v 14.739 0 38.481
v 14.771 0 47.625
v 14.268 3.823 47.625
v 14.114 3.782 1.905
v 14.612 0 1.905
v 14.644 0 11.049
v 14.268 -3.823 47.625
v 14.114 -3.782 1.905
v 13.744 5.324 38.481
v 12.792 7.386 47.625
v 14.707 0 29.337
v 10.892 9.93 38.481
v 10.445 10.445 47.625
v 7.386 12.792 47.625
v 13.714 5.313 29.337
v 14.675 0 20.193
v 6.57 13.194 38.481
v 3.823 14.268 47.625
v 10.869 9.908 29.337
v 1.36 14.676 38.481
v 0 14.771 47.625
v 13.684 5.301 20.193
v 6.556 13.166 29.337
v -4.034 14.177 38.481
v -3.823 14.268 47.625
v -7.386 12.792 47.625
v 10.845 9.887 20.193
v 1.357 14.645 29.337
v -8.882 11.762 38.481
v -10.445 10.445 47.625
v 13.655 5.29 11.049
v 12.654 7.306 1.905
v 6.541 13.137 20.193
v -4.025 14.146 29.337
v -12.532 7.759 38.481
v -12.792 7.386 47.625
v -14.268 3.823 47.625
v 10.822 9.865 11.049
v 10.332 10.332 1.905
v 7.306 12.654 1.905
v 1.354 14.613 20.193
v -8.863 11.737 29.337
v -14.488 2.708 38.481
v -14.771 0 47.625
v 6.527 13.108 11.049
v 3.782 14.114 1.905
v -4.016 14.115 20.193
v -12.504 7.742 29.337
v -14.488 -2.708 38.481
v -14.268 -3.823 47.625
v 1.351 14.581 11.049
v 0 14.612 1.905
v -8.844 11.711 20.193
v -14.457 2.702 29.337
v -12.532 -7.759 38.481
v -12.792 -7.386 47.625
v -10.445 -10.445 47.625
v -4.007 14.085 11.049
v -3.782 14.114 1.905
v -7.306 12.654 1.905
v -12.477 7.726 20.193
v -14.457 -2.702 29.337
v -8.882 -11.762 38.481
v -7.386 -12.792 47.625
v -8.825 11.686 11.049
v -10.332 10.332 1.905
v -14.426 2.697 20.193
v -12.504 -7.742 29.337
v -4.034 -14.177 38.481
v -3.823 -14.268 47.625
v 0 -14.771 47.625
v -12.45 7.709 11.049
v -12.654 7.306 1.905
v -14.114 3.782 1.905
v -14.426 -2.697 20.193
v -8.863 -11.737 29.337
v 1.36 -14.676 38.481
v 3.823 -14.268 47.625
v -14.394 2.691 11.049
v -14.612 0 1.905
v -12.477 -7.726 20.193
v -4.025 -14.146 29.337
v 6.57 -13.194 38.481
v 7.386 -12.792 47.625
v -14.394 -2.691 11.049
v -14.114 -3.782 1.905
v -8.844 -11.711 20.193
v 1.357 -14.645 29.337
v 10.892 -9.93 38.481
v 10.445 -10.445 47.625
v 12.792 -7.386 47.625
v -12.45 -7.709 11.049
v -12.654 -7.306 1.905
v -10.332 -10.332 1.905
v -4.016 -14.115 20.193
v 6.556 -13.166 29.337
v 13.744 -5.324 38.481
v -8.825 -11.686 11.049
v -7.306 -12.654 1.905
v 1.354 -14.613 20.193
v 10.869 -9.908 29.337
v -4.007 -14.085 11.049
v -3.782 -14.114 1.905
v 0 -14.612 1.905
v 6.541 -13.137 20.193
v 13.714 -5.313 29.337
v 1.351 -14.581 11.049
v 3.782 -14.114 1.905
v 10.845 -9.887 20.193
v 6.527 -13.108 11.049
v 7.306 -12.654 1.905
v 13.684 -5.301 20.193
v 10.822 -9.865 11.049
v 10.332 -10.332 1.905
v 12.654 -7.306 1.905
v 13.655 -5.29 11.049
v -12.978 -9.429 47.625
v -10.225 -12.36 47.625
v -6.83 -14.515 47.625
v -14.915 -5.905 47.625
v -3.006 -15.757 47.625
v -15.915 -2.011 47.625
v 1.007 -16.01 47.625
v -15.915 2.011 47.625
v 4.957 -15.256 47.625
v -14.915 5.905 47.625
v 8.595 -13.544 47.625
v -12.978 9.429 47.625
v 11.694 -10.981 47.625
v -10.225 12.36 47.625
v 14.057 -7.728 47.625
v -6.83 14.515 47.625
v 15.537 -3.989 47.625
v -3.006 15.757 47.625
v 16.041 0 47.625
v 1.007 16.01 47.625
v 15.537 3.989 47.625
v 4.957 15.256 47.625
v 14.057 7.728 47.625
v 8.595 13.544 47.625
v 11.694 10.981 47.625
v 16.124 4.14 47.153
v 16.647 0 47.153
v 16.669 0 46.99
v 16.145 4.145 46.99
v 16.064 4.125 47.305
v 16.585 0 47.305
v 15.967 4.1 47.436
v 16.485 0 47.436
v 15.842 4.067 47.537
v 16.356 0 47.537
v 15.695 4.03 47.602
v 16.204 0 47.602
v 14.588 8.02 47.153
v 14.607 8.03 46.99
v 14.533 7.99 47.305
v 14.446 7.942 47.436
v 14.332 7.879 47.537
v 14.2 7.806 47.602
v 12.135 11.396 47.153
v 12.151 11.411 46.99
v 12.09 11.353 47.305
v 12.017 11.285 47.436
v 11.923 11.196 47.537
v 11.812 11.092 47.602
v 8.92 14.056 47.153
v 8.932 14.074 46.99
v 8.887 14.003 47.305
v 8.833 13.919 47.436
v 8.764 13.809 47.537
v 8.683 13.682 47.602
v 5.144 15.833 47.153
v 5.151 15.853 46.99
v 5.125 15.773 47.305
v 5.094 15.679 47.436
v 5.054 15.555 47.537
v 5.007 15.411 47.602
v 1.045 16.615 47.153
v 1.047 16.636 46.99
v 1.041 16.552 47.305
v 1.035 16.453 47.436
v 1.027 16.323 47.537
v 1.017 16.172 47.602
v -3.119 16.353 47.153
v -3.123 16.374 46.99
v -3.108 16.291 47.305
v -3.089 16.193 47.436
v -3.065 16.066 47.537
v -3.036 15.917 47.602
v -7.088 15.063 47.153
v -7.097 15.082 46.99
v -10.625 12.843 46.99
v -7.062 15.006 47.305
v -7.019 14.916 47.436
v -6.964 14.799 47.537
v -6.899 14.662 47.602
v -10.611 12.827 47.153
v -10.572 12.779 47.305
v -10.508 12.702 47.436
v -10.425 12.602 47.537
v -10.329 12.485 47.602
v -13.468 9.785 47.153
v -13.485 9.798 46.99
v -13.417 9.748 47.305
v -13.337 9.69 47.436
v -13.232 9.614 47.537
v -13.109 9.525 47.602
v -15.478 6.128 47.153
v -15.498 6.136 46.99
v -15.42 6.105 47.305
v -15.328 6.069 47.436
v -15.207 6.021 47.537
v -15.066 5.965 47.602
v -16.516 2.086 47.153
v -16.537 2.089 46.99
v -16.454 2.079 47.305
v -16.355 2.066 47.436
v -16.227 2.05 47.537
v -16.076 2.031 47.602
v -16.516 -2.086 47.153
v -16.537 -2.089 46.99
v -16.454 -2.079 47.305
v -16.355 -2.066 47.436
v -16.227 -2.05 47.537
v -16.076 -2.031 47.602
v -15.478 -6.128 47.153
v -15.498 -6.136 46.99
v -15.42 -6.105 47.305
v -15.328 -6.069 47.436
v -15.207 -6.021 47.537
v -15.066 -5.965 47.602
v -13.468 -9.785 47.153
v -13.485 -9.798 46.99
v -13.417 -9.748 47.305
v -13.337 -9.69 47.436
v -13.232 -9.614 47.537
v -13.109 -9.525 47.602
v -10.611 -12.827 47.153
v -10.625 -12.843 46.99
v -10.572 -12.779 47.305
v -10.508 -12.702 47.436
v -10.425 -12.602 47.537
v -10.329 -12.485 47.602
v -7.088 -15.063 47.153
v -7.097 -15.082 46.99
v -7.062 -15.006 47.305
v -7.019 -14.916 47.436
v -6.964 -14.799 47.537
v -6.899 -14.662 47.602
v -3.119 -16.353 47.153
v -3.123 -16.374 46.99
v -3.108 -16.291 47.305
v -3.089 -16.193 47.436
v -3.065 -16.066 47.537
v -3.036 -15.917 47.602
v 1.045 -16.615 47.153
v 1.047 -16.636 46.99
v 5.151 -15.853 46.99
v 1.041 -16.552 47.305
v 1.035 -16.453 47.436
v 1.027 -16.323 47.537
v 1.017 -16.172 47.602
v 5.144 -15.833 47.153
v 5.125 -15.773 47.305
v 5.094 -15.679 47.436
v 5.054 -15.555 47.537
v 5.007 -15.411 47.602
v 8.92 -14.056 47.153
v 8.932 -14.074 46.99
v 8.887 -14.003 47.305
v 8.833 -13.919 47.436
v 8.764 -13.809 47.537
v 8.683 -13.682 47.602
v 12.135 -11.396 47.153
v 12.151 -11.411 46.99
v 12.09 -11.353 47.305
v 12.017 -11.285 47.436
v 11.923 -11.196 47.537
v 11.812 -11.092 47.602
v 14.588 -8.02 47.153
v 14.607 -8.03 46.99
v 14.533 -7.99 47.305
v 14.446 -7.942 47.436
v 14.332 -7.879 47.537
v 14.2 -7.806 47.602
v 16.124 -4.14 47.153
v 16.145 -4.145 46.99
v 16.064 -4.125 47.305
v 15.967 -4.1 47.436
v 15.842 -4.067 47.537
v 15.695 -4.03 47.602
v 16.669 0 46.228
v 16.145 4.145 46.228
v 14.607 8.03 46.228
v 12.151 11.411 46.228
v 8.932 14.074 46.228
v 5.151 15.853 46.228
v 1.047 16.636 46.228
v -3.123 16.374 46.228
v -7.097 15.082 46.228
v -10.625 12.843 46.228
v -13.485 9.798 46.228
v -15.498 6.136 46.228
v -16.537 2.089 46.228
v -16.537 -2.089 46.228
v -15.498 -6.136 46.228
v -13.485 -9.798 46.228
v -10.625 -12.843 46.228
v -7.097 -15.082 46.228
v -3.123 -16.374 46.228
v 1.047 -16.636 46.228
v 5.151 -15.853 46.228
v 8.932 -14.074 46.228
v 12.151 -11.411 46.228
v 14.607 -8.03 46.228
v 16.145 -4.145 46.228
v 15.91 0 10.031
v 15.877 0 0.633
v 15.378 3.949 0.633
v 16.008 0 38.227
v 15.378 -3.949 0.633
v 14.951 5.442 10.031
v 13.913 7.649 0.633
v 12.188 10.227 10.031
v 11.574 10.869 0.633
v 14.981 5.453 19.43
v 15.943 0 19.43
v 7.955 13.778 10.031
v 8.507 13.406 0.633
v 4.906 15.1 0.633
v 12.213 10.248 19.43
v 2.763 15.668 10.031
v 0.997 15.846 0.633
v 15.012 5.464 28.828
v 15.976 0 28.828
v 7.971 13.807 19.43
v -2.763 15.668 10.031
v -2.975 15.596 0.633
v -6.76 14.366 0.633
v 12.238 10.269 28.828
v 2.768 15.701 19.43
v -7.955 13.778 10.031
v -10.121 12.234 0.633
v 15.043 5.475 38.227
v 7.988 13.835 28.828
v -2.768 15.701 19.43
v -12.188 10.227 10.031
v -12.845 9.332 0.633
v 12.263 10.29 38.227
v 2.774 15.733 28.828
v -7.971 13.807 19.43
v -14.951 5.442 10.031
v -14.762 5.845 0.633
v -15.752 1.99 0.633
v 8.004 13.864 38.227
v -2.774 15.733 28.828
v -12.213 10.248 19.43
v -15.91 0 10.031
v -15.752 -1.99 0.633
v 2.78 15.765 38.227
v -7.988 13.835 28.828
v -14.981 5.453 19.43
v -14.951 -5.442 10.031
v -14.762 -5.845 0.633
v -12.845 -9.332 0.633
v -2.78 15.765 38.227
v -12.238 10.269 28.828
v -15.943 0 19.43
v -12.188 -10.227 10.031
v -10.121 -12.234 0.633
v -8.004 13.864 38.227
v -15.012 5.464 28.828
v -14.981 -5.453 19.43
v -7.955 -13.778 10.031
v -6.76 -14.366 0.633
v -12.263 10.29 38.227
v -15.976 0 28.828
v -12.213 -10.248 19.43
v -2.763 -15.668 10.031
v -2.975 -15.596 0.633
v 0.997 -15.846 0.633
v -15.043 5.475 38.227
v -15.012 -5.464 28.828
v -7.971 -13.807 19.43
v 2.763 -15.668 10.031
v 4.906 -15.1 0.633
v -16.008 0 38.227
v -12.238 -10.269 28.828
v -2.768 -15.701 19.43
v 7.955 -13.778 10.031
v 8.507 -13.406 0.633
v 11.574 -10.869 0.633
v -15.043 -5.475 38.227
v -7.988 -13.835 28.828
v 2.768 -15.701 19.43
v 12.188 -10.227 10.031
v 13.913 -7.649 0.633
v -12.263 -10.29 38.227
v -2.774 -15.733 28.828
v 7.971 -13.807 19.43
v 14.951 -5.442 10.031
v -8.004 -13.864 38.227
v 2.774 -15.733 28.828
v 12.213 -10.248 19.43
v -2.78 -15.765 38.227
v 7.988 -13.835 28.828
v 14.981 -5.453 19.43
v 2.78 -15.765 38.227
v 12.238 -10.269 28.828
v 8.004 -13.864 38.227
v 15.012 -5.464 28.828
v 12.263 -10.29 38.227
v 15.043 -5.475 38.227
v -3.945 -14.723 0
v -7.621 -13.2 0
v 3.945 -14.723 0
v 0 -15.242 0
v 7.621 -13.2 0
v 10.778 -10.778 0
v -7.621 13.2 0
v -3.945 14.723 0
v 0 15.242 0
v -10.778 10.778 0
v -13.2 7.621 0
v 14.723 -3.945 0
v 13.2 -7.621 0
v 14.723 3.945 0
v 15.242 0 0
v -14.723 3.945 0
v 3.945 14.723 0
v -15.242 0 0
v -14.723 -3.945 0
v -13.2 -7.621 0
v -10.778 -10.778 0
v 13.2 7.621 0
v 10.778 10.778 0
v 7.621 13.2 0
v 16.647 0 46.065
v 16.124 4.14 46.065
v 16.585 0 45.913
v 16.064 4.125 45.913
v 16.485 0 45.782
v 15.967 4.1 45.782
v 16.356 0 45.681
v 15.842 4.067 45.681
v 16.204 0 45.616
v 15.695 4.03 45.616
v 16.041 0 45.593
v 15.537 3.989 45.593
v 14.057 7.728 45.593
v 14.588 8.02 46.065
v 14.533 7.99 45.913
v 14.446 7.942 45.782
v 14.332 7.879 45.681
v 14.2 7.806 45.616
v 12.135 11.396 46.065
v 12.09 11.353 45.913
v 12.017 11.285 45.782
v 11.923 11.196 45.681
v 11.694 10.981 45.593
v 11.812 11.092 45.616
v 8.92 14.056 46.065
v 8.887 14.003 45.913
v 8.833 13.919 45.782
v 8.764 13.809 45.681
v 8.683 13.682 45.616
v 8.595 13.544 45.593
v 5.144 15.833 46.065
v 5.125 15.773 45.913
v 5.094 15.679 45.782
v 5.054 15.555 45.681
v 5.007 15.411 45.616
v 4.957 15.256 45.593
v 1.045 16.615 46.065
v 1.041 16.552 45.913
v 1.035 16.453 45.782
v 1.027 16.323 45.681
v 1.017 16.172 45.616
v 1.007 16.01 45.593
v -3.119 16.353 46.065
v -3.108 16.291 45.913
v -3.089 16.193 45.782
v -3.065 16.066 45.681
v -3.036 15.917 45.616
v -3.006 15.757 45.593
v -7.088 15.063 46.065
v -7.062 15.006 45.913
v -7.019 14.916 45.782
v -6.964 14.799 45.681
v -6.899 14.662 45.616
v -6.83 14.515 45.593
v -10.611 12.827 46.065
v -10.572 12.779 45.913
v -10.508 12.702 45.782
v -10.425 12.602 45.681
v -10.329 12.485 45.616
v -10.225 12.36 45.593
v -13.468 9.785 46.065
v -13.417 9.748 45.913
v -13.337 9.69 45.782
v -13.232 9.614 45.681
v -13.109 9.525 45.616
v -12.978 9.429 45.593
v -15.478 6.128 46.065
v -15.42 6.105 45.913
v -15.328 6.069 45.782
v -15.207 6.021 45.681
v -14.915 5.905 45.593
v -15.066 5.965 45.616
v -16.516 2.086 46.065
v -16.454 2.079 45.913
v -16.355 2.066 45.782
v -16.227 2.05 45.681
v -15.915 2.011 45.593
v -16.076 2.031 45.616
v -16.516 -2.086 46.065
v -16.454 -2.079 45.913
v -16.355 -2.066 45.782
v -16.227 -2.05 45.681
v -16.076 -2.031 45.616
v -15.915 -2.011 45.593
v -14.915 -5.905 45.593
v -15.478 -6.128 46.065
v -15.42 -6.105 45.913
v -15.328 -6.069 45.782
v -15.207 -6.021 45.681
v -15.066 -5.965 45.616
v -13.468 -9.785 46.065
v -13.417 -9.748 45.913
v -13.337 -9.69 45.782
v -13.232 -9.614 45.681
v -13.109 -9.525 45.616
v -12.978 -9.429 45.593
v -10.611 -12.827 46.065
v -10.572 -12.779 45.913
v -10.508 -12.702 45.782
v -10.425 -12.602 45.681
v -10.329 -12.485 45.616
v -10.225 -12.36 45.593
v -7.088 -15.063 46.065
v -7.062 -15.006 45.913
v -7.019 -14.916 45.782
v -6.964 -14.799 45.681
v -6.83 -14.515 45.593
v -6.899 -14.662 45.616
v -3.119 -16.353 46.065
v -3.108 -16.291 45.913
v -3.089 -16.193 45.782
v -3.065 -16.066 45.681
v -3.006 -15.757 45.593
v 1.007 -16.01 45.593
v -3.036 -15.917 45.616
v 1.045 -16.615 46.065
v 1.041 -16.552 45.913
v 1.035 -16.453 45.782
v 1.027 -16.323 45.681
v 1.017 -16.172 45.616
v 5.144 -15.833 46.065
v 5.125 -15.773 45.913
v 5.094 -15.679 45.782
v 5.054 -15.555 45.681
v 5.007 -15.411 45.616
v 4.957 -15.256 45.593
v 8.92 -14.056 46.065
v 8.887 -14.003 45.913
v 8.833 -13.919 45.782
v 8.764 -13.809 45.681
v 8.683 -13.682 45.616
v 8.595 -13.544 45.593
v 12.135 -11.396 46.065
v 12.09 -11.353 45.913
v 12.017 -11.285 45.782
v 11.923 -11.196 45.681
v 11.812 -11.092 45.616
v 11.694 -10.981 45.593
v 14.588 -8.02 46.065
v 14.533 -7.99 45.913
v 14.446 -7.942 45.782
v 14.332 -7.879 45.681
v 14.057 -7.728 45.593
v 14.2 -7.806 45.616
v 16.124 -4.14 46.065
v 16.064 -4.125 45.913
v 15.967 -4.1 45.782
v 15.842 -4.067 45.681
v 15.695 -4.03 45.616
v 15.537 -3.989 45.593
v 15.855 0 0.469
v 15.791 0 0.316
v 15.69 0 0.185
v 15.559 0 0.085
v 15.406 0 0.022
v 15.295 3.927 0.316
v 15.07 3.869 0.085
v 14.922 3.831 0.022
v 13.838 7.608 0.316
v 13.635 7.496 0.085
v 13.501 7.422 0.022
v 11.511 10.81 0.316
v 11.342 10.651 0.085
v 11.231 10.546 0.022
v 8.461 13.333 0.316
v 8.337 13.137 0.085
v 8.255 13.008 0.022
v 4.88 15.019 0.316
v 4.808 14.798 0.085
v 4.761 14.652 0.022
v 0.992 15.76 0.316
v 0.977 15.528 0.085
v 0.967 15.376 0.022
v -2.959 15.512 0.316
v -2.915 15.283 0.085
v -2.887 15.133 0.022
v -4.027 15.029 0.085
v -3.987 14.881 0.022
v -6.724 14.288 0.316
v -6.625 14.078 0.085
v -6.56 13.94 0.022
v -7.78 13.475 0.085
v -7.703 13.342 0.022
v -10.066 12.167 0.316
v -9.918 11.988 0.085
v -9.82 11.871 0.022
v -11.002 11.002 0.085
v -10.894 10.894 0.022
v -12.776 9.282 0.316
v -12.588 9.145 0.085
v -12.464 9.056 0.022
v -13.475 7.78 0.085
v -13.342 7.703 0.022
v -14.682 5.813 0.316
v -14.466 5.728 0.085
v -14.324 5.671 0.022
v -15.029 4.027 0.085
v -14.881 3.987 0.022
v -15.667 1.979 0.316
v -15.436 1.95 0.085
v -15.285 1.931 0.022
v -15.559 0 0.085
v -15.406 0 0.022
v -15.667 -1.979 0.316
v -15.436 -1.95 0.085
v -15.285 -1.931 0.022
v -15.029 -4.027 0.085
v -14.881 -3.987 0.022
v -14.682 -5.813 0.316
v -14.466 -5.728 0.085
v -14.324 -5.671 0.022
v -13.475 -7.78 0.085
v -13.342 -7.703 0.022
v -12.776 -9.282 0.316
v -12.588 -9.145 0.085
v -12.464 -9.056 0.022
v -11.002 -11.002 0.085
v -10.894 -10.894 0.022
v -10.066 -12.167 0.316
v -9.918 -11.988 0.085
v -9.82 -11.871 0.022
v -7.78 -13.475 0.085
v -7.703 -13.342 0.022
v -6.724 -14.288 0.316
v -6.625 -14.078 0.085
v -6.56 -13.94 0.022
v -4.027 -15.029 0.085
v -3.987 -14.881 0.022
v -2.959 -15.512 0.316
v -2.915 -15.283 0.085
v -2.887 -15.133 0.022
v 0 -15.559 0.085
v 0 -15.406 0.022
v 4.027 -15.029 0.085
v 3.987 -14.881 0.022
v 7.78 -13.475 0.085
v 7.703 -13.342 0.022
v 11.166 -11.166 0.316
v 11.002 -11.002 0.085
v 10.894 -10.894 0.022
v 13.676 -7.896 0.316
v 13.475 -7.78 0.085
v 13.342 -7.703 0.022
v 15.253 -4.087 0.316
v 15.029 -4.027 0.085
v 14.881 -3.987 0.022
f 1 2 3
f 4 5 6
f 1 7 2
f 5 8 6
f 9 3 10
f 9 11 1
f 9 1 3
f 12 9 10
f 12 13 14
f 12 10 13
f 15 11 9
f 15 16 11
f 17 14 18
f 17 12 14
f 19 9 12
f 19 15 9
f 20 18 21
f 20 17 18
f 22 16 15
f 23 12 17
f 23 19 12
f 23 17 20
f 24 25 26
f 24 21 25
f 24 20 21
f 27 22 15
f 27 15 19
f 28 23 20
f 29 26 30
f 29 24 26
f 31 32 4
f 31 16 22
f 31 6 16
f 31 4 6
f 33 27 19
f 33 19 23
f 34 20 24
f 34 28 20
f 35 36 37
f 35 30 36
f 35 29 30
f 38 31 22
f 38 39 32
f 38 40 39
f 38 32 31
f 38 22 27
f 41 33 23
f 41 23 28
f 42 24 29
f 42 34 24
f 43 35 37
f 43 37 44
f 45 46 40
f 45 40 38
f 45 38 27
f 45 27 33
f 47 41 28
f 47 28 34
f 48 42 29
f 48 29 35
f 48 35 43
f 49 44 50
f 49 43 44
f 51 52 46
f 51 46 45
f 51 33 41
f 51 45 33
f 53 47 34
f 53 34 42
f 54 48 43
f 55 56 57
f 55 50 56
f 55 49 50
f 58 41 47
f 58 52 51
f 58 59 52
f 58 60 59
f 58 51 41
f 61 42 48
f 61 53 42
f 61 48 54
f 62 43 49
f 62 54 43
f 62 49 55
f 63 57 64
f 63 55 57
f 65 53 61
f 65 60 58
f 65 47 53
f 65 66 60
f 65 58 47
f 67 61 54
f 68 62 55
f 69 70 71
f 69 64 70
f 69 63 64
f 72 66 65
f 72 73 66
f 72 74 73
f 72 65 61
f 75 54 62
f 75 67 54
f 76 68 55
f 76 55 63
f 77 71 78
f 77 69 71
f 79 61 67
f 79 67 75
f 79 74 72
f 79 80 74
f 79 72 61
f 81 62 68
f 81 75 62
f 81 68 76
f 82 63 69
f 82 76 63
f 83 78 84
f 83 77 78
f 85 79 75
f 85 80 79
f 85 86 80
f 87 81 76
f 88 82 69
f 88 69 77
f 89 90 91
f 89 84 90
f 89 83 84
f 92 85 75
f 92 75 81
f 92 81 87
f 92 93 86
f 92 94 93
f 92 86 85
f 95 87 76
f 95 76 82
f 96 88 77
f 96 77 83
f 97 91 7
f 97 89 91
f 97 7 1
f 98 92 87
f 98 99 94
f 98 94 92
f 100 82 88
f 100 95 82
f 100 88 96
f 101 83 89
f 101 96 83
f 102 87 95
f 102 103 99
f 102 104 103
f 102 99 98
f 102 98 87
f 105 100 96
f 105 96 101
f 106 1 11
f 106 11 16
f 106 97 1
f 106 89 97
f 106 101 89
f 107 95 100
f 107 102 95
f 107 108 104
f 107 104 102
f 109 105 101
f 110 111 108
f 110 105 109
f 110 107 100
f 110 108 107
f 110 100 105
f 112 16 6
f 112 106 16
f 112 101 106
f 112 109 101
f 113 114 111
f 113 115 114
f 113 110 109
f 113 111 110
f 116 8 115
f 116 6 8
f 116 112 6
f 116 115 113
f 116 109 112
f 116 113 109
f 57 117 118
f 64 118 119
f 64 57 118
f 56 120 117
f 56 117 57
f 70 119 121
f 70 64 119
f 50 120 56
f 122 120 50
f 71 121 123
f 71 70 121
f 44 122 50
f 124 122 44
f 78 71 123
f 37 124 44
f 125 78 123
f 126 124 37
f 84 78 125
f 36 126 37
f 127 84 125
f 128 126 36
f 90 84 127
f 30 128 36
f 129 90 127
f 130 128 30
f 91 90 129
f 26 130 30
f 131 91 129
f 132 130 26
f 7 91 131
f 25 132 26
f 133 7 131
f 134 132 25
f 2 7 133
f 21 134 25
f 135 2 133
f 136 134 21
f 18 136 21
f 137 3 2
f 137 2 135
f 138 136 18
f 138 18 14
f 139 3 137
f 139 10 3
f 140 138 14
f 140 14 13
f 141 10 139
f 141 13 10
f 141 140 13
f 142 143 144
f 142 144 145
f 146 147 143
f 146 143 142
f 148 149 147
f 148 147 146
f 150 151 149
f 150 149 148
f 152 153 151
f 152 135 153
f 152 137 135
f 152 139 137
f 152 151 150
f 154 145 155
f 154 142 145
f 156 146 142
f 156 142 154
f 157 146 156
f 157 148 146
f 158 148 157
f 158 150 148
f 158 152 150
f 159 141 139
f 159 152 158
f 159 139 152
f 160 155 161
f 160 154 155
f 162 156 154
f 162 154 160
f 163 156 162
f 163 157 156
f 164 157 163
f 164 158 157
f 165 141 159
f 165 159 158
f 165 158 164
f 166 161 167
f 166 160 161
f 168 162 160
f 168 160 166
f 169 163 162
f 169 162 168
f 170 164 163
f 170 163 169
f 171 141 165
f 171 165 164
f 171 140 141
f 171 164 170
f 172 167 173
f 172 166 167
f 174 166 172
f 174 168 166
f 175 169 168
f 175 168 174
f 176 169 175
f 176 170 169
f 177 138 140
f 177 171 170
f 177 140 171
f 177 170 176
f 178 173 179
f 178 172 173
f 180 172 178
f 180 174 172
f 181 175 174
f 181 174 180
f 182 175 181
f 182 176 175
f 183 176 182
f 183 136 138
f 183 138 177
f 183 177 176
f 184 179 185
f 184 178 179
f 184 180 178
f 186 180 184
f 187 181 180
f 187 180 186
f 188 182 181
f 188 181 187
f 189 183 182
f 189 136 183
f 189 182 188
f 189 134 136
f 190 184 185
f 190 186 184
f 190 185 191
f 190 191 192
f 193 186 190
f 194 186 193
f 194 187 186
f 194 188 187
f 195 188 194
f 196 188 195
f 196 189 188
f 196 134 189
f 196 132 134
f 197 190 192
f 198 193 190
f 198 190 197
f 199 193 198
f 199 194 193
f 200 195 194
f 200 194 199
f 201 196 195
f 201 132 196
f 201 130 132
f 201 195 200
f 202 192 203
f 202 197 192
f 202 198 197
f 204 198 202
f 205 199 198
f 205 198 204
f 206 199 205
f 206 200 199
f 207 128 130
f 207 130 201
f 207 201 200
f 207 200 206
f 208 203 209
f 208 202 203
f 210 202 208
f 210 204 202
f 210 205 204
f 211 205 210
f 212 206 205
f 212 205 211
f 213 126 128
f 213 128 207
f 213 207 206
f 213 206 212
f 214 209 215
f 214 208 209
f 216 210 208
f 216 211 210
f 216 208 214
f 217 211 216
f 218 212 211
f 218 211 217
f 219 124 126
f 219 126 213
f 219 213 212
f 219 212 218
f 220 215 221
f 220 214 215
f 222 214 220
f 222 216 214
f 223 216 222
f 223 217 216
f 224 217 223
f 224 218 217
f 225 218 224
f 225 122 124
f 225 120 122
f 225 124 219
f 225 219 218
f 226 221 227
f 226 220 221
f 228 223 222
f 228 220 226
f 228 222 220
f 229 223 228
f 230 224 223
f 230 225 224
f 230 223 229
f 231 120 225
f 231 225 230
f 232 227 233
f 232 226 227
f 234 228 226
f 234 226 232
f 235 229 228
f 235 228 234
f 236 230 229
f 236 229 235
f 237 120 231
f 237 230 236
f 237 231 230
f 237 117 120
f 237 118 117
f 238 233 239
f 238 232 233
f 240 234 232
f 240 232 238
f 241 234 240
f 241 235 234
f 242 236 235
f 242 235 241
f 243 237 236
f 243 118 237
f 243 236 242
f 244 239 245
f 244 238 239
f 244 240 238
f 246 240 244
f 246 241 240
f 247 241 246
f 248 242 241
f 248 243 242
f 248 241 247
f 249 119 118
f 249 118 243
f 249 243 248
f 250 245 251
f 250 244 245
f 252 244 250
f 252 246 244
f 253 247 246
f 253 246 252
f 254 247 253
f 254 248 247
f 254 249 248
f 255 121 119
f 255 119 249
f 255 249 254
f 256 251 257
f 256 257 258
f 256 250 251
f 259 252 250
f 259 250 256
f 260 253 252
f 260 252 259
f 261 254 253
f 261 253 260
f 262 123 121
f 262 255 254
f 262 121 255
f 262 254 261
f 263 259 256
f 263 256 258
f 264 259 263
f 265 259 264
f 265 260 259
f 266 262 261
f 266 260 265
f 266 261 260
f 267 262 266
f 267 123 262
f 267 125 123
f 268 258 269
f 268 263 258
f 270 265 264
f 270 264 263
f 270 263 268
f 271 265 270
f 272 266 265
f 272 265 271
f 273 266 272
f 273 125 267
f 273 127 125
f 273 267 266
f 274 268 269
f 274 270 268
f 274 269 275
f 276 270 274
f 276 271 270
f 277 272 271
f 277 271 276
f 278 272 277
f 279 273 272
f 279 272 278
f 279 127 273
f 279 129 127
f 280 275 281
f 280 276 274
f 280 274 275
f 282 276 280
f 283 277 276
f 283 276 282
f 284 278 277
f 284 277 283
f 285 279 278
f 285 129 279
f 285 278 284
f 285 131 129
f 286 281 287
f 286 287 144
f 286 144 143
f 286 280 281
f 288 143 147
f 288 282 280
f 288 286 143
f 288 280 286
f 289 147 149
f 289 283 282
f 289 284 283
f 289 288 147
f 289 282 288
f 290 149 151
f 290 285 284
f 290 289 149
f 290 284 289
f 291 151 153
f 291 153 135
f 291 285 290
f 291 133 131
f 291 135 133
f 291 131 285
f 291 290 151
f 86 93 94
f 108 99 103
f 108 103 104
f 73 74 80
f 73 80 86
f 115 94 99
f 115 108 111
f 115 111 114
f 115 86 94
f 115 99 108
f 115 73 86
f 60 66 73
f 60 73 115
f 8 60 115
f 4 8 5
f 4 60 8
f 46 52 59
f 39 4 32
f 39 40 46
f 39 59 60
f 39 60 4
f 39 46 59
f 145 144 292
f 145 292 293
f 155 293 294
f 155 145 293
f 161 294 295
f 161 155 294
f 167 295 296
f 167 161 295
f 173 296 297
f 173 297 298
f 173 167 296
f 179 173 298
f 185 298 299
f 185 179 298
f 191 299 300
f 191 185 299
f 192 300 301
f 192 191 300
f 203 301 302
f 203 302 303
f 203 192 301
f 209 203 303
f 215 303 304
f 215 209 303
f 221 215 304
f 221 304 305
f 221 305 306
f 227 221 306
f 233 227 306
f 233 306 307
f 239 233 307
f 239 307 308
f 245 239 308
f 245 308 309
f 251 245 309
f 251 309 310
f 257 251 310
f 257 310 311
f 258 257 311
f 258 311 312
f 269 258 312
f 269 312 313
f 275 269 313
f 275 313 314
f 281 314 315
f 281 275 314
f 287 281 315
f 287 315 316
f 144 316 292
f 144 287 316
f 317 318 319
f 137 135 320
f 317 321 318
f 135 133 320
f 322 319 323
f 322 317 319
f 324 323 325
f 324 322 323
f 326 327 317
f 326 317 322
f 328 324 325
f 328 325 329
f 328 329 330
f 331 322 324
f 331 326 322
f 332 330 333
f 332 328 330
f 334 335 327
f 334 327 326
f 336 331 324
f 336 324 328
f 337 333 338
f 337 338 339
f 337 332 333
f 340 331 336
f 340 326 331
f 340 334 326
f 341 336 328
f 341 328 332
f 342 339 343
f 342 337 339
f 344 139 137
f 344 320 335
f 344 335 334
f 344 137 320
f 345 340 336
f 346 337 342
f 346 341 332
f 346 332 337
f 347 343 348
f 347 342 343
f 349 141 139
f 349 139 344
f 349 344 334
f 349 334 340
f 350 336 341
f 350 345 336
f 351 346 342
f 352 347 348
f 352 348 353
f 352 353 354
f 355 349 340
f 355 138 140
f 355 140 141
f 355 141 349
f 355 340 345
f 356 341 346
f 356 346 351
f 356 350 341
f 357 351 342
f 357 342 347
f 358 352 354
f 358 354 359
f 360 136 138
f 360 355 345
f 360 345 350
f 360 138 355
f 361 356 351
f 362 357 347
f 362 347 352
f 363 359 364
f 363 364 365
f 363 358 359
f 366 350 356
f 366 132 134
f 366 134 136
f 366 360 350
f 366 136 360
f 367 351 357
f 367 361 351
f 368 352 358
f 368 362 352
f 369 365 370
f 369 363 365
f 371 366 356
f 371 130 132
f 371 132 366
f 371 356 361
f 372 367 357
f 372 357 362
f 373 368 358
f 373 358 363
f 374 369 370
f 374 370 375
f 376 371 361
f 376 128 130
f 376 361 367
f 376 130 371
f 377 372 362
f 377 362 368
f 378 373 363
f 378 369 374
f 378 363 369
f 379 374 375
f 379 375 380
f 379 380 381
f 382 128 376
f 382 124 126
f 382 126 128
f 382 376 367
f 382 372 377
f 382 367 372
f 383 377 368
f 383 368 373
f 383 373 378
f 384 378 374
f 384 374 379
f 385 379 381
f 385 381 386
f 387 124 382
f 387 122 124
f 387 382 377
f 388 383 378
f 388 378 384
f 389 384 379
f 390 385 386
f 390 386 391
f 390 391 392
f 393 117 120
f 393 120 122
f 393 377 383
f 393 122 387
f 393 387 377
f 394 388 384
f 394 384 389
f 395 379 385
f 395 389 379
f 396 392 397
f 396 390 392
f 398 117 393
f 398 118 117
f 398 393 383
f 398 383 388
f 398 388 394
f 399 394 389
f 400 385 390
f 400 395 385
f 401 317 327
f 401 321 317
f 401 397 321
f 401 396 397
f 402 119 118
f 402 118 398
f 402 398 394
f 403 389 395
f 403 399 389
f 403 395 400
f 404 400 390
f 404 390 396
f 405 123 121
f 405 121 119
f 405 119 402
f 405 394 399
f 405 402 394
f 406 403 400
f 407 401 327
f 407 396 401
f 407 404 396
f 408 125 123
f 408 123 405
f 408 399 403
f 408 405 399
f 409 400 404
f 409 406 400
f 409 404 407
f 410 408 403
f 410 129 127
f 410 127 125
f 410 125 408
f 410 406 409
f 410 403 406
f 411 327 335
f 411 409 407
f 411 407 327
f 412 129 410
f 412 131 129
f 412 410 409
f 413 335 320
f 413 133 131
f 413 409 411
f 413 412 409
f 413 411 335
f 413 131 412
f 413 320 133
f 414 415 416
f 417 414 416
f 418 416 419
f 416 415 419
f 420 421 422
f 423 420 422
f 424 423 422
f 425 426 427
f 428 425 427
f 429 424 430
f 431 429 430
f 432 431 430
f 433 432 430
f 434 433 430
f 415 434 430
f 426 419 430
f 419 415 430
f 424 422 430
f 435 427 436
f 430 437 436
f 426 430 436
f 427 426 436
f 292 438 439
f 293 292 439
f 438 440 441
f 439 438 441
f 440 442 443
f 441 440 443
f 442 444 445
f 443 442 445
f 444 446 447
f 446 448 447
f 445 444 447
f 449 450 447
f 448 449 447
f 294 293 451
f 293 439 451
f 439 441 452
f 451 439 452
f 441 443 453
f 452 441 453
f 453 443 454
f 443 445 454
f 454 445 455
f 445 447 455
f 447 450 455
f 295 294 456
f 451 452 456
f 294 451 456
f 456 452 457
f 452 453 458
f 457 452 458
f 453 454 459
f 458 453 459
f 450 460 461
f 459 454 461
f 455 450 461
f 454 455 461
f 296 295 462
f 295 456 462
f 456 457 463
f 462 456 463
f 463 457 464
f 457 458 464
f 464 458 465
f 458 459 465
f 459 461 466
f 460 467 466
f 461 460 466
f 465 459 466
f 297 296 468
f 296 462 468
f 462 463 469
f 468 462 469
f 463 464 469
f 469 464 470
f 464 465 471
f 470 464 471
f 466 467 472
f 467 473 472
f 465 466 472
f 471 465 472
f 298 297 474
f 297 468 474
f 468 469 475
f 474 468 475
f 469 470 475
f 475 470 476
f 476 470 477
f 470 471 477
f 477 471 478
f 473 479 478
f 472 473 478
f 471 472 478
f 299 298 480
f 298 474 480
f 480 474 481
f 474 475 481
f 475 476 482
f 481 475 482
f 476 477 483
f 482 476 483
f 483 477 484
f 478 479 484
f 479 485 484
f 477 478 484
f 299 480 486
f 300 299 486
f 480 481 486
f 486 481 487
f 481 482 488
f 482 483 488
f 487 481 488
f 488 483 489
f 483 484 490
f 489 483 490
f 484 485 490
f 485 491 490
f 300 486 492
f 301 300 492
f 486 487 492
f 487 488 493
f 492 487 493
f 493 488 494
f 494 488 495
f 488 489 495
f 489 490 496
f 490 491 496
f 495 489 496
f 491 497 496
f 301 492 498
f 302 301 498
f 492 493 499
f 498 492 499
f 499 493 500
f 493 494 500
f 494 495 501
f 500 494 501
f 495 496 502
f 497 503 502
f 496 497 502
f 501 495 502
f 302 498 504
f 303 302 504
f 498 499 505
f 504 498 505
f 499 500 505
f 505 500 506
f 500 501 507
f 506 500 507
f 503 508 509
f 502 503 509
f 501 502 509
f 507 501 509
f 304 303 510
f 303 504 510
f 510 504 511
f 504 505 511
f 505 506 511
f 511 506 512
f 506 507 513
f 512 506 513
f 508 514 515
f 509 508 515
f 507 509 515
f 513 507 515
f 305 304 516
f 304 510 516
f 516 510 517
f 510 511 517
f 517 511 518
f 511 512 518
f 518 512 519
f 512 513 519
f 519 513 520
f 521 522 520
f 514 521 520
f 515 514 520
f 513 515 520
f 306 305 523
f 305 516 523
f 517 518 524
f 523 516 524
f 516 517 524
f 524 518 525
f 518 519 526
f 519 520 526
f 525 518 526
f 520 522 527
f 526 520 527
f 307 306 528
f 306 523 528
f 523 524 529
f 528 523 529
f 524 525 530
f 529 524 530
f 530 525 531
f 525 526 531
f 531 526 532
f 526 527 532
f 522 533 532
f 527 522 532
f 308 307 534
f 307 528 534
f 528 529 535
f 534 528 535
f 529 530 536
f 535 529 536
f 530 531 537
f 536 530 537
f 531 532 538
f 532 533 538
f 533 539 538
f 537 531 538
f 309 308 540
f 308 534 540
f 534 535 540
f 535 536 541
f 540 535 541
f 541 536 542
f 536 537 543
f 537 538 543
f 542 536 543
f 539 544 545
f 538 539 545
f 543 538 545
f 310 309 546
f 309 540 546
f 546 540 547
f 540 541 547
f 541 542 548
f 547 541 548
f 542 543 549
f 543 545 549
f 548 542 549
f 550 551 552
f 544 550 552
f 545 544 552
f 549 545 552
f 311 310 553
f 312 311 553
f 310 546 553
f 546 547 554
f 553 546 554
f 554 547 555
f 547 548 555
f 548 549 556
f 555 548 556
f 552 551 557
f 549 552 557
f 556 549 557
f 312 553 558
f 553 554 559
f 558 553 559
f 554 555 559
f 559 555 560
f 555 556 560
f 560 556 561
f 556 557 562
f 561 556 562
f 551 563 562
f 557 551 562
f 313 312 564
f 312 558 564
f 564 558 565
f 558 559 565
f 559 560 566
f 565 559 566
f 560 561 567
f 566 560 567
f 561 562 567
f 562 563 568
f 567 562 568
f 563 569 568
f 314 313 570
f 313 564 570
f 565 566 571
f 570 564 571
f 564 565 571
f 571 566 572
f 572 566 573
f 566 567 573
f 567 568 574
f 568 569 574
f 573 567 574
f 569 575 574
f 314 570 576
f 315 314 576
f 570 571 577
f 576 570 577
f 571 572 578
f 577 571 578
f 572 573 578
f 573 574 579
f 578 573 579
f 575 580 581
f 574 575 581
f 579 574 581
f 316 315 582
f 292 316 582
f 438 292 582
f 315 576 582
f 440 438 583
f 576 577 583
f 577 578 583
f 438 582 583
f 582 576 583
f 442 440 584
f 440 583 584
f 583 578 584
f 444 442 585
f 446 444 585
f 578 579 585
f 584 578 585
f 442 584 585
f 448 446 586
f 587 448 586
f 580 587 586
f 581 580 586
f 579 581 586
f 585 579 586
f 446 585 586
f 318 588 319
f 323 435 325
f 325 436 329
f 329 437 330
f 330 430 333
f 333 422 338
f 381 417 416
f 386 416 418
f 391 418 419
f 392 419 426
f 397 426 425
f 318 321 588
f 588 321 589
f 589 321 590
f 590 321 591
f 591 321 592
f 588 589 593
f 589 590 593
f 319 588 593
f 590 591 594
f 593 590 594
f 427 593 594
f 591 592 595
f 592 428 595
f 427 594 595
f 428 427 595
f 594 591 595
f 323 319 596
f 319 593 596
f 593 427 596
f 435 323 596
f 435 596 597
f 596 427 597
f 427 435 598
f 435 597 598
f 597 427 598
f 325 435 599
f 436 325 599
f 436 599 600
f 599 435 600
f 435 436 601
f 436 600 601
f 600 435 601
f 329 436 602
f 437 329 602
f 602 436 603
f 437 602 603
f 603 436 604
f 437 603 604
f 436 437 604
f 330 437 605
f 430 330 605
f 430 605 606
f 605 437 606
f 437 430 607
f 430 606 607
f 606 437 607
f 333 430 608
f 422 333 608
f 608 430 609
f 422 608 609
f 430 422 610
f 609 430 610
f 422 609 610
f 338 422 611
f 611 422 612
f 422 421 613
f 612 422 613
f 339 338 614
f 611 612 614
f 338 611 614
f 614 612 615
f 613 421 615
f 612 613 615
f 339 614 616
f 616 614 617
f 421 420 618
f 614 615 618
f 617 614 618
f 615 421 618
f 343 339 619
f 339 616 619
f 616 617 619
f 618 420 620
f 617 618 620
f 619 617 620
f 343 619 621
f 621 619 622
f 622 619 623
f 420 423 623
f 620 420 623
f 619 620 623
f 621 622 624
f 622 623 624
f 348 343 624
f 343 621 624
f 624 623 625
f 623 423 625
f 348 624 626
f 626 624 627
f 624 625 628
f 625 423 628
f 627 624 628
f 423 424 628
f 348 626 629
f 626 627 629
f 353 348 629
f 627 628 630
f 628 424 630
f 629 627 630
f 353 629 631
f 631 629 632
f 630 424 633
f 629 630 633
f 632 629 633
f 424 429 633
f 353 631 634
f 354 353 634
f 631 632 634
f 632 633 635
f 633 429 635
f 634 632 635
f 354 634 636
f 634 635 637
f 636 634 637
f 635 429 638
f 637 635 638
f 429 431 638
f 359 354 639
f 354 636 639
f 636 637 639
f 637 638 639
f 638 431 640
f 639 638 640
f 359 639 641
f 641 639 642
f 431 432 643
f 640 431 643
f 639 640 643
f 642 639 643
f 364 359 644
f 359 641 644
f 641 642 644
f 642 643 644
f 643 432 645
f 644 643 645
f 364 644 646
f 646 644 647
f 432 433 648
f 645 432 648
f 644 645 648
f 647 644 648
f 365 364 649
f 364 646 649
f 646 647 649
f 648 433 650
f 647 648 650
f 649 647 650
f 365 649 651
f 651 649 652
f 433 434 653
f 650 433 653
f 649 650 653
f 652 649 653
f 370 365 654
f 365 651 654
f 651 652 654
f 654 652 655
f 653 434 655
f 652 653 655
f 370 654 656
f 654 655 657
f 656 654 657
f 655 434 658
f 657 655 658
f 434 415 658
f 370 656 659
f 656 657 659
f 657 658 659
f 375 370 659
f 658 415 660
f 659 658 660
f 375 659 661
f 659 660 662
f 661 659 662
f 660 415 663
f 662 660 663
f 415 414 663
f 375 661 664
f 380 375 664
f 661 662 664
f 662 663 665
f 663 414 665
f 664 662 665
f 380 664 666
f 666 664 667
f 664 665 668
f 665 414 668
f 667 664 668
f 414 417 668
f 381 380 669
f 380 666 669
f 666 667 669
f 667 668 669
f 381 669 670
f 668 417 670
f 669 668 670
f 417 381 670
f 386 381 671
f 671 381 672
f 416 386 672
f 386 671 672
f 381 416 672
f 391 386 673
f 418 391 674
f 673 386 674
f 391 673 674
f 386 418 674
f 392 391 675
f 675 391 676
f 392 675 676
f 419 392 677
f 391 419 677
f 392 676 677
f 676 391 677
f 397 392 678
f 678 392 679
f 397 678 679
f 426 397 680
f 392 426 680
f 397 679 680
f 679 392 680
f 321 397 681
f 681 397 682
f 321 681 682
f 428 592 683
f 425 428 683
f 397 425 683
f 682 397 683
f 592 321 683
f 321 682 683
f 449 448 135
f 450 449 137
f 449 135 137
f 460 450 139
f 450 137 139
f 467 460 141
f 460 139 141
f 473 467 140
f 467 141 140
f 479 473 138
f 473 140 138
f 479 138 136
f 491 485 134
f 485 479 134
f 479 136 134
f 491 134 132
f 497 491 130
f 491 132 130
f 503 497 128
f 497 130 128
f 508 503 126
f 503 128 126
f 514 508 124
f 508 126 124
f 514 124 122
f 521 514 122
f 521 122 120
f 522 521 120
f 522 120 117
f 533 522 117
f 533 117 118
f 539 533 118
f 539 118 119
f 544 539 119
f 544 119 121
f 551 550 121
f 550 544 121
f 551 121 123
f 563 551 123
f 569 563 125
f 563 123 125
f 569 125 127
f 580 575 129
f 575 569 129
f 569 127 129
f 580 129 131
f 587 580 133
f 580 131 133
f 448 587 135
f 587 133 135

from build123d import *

# Parameters (mm, degrees)
F0_R     = 15.875
F1_DEPTH = 47.625
F1_TAPER = -0.2
F2_R     = 14.7712432865
F3_DEPTH = 45.72
F3_TAPER = 0.2
F4_R     = 16.66875
F4_R_2   = 16.0412432865
F5_DEPTH = 2.032
F6_R     = 0.635


# Not quite as in the source:
# - a fillet or chamfer that OpenCascade refuses, or shapes differently, is made with other operations: its cross-section is extruded or revolved along the edge and cut away or added


with BuildPart() as f1:
    # F0 (on Top) → F1 (new body)
    with BuildSketch(Plane.XY):
        Circle(F0_R)
    extrude(amount=F1_DEPTH, taper=F1_TAPER)

    # F2 (on face) → F3 (cut)
    with BuildSketch(Plane.XY.offset(47.625)):
        Circle(F2_R)
    extrude(amount=-F3_DEPTH, taper=F3_TAPER, mode=Mode.SUBTRACT)

    # F6
    f6_edges = [f1.edges().sort_by_distance(p)[0] for p in [
        (-15.875, 0, 0),
    ]]
    fillet(f6_edges, radius=F6_R)


with BuildPart() as f5:
    # F4 (on face) → F5 (new body)
    with BuildSketch(Plane.XY.offset(47.625)):
        Circle(F4_R)
        Circle(F4_R_2, mode=Mode.SUBTRACT)
    extrude(amount=-F5_DEPTH)

    # F7: fillet of radius 0.635 on 1 edges, made by hand

    # F7_s1 → F7_t2 (revolve, cut)
    with BuildSketch(Plane.XZ):
        with BuildLine():
            ThreePointArc((16.66875, 46.228), (16.4827628061, 45.7789871939), (16.03375, 45.593))
            Line((16.03375, 45.593), (16.66875, 45.593))
            Line((16.66875, 45.593), (16.66875, 46.228))
        make_face()
    revolve(axis=Axis((0, 0, 45.593), (0, 0, 1)), mode=Mode.SUBTRACT)

    # F8: fillet of radius 0.635 on 1 edges, made by hand

    # F8_s1 → F8_t2 (revolve, cut)
    with BuildSketch(Plane.XZ):
        with BuildLine():
            ThreePointArc((16.66875, 46.99), (16.4827628061, 47.4390128061), (16.03375, 47.625))
            Line((16.03375, 47.625), (16.66875, 47.625))
            Line((16.66875, 47.625), (16.66875, 46.99))
        make_face()
    revolve(axis=Axis((0, 0, 47.625), (0, 0, 1)), mode=Mode.SUBTRACT)


solid = Compound([f1.part, f5.part])
